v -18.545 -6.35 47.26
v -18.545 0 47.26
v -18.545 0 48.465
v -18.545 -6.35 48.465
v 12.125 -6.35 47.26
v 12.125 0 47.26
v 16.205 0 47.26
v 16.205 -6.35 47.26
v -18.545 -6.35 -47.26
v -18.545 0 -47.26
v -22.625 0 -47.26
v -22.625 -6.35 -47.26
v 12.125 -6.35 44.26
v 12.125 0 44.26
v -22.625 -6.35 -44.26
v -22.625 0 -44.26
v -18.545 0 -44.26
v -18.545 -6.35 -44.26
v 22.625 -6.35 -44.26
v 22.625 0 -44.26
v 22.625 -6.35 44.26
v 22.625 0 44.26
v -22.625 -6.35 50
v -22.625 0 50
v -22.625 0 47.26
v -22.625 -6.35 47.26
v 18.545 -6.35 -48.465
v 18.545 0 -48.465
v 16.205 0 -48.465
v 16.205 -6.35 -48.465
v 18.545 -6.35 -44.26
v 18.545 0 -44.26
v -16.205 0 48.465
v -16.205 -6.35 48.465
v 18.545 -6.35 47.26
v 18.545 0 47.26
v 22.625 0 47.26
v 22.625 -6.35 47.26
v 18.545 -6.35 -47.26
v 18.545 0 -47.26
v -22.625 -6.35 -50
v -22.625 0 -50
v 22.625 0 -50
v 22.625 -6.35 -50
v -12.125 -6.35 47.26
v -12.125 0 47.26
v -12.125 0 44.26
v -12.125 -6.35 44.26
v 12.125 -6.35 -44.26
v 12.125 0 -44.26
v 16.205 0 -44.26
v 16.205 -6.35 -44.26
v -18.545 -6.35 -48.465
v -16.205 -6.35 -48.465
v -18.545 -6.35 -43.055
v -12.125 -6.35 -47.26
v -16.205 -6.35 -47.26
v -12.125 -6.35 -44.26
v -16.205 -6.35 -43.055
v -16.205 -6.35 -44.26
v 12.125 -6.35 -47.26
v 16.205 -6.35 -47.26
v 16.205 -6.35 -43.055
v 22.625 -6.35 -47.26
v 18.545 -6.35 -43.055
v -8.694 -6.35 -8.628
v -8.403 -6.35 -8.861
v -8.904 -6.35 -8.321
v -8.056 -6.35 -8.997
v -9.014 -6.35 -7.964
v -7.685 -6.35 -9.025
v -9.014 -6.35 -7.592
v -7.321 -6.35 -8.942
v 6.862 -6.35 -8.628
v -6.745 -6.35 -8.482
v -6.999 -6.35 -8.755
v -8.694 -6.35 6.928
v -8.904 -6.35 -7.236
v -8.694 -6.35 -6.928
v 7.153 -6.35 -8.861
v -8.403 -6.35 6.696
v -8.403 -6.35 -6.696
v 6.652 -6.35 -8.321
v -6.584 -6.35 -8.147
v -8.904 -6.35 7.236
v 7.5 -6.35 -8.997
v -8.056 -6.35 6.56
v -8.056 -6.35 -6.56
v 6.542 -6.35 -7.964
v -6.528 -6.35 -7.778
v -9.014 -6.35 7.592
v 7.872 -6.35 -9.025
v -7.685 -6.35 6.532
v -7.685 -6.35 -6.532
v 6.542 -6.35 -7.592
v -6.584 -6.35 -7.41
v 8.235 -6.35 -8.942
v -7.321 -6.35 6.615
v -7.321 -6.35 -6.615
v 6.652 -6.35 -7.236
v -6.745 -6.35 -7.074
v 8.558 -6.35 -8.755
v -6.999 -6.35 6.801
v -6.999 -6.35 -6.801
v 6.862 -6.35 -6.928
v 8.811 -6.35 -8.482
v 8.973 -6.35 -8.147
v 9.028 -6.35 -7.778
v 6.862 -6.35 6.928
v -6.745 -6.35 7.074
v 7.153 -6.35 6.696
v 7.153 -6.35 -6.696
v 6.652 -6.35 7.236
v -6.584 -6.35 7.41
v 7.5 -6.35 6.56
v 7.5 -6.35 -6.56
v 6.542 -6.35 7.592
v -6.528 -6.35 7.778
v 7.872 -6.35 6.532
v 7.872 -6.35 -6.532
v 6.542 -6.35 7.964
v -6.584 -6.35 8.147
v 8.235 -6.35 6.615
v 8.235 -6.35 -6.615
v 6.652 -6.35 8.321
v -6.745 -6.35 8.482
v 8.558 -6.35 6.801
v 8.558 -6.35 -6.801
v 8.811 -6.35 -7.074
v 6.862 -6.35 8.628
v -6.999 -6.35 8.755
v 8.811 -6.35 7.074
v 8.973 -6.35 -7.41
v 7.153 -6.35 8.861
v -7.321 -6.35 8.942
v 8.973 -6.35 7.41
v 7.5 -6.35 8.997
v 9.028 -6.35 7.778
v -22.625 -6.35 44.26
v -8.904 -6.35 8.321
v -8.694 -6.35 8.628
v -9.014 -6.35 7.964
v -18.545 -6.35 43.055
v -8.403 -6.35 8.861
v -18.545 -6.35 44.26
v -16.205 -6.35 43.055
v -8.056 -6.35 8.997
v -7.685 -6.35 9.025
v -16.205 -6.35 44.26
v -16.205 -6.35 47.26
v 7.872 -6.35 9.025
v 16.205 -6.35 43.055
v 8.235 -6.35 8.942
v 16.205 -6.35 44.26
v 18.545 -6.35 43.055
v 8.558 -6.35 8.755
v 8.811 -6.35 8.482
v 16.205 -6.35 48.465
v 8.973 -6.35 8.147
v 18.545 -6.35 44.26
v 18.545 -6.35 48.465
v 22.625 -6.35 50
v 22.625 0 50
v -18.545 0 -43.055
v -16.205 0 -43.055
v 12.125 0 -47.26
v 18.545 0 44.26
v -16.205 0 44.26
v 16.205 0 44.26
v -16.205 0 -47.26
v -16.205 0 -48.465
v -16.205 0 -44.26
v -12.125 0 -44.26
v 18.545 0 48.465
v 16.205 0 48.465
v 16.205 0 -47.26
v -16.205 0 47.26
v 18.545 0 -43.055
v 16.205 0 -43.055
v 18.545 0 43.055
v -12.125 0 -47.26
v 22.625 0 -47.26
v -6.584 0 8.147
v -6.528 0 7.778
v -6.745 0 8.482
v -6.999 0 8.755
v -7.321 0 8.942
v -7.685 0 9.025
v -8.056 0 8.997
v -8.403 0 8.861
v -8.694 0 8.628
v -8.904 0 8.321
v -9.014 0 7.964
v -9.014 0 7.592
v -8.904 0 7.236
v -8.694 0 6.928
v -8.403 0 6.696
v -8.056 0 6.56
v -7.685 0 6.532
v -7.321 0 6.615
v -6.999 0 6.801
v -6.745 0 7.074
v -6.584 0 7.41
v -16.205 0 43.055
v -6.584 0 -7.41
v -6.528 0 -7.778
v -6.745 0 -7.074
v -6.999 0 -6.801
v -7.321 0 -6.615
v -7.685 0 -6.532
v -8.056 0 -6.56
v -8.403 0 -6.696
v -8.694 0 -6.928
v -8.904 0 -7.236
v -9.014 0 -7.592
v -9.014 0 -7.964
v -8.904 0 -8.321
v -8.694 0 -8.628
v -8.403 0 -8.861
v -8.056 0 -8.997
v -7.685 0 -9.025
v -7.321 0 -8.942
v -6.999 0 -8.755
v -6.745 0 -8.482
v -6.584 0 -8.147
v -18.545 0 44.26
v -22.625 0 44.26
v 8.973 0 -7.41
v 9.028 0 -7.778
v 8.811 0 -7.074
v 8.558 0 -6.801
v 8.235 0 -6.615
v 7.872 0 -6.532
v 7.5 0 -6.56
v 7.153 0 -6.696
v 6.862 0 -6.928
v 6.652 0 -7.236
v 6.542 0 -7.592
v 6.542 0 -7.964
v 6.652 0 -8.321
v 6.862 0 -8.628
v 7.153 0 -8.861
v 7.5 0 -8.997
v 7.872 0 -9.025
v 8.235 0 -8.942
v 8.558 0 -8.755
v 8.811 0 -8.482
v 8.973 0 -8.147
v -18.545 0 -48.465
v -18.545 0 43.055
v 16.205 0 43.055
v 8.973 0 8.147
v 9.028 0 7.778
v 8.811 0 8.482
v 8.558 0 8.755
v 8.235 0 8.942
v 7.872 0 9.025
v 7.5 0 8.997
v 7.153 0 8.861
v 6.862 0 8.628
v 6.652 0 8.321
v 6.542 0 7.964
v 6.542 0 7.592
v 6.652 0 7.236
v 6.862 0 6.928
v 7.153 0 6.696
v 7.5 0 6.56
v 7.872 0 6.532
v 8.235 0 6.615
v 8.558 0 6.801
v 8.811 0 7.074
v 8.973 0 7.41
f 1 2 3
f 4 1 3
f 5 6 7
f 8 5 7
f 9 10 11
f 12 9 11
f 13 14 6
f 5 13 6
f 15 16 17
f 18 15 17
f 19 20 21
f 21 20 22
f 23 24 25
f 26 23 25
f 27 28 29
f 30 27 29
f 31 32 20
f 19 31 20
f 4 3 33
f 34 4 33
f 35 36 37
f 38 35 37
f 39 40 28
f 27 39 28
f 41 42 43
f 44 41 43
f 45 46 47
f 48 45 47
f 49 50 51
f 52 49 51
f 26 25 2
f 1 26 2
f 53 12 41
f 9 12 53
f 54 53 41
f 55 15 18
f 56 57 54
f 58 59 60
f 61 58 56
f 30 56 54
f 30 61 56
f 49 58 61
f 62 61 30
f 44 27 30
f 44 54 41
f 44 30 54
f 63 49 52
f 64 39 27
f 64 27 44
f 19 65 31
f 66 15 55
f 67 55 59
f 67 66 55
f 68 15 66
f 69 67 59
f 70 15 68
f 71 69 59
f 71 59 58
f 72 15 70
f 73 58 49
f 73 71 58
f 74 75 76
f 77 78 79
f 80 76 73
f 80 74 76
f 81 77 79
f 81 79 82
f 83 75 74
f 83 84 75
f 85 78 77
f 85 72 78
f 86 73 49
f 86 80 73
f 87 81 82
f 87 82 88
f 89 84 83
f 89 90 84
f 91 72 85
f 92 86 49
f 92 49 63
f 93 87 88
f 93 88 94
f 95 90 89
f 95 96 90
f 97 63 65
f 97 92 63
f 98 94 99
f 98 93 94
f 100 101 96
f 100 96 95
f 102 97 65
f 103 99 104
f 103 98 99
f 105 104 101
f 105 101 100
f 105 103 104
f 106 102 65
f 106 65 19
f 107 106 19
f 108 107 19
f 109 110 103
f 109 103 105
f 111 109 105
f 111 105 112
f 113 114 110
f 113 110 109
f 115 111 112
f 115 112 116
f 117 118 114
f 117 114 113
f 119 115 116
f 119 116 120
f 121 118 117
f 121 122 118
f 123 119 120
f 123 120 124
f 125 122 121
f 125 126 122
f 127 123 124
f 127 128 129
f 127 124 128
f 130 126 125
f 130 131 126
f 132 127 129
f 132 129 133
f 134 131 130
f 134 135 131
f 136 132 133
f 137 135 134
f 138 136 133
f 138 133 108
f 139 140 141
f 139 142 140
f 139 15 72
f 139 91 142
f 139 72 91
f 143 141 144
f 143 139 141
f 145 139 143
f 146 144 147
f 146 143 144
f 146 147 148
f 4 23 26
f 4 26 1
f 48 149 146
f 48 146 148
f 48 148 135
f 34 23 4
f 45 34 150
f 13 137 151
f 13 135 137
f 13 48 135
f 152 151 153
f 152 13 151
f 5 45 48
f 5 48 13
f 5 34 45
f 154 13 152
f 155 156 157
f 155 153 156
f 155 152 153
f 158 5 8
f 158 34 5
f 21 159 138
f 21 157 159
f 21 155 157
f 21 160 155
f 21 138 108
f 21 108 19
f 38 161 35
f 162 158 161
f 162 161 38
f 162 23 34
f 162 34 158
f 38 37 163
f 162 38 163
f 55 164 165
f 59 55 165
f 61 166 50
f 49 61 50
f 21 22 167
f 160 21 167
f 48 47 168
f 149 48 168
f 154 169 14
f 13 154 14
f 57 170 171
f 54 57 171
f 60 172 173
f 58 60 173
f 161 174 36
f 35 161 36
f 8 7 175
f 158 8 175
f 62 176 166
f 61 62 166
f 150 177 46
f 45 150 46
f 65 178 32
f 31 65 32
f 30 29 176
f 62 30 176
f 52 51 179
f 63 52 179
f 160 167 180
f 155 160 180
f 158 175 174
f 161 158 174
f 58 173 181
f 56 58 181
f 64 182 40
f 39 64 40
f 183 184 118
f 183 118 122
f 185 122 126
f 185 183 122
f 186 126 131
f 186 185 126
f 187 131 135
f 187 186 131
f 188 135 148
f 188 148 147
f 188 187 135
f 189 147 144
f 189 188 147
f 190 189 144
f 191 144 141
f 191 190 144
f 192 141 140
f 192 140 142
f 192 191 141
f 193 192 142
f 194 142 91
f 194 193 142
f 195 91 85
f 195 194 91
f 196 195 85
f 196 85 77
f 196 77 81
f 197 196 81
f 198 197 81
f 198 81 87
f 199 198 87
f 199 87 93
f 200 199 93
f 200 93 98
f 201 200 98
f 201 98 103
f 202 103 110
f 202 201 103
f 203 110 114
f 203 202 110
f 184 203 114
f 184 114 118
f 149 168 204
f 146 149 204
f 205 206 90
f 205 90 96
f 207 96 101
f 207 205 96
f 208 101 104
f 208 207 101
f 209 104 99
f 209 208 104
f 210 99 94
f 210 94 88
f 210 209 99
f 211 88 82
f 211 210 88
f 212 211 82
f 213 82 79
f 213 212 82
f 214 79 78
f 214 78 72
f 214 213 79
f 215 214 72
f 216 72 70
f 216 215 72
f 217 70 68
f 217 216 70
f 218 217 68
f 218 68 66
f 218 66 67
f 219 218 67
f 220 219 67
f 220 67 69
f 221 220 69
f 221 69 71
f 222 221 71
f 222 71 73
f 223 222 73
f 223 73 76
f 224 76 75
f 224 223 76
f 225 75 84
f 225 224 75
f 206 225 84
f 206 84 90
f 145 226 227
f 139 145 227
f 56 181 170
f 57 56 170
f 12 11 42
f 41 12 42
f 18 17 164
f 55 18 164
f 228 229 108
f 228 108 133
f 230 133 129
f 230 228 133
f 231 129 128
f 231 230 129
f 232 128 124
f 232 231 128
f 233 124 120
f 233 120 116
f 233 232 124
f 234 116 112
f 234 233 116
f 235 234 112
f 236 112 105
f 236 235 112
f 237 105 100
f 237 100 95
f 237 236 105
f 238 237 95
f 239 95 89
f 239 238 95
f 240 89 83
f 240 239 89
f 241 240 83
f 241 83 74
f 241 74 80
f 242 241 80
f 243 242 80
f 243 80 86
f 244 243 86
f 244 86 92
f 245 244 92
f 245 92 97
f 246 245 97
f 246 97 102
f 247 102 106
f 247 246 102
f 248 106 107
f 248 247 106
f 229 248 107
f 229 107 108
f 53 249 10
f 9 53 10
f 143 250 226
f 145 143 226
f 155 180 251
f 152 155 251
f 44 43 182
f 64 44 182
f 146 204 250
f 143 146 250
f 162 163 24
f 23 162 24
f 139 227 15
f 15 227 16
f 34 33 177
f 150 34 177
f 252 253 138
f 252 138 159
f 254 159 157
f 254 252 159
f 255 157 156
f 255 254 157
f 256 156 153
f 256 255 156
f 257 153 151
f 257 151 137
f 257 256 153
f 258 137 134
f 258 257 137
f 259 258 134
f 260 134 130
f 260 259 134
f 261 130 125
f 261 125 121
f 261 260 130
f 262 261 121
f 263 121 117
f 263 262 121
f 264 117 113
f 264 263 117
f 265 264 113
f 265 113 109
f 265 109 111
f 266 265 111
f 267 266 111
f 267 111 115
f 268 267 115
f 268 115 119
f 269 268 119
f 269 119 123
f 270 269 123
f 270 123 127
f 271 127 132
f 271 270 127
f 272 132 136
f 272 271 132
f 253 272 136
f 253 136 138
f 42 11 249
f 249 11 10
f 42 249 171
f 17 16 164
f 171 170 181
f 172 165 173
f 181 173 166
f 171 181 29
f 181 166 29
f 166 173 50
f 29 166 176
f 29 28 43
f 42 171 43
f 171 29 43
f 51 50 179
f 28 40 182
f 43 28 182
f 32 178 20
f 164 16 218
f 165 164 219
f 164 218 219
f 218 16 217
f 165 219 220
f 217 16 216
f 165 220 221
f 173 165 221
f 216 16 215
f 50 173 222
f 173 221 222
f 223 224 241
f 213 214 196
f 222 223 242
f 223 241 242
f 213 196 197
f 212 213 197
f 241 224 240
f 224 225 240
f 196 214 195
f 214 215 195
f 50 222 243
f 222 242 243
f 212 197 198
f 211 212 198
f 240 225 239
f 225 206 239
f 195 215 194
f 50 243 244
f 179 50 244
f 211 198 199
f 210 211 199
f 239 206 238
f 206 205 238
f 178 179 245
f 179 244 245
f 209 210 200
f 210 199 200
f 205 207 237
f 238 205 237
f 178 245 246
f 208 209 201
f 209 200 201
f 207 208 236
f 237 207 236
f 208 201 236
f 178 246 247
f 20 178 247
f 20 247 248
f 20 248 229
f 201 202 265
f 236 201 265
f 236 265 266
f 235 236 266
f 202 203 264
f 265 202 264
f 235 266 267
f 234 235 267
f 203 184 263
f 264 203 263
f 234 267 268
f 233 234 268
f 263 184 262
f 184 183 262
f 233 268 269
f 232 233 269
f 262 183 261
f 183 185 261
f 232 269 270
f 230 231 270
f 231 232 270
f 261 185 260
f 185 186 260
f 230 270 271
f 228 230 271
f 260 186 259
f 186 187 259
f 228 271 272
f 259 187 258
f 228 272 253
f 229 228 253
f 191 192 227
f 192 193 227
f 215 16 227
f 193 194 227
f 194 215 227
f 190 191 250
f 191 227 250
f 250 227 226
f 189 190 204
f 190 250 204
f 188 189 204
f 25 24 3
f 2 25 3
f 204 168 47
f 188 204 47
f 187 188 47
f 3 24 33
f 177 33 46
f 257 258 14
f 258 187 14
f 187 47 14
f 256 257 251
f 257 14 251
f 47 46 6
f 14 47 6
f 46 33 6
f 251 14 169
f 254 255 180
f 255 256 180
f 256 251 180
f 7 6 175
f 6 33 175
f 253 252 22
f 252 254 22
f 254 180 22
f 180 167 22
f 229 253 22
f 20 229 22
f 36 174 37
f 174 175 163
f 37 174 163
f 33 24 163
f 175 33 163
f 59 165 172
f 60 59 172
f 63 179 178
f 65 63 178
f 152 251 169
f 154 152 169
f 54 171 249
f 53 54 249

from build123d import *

# Parameters (mm, degrees)
F0_R     = 1.25
F1_DEPTH = 6.35


with BuildPart() as f1:
    # F0 (on Front) → F1 (new body)
    with BuildSketch(Plane.XZ):
        Polygon((22.625, 47.26), (22.625, 50), (-22.625, 50), (-22.625, 47.26), (-18.545, 47.26), (-18.545, 48.465), (-16.205, 48.465), (-16.205, 47.26), (-12.125, 47.26), (-12.125, 44.26), (-16.205, 44.26), (-16.205, 43.055), (-18.545, 43.055), (-18.545, 44.26), (-22.625, 44.26), (-22.625, -44.26), (-18.545, -44.26), (-18.545, -43.055), (-16.205, -43.055), (-16.205, -44.26), (-12.125, -44.26), (-12.125, -47.26), (-16.205, -47.26), (-16.205, -48.465), (-18.545, -48.465), (-18.545, -47.26), (-22.625, -47.26), (-22.625, -50), (22.625, -50), (22.625, -47.26), (18.545, -47.26), (18.545, -48.465), (16.205, -48.465), (16.205, -47.26), (12.125, -47.26), (12.125, -44.26), (16.205, -44.26), (16.205, -43.055), (18.545, -43.055), (18.545, -44.26), (22.625, -44.26), (22.625, 44.26), (18.545, 44.26), (18.545, 43.055), (16.205, 43.055), (16.205, 44.26), (12.125, 44.26), (12.125, 47.26), (16.205, 47.26), (16.205, 48.465), (18.545, 48.465), (18.545, 47.26), align=None)
        with Locations((-7.778175, -7.778175)):
            Circle(F0_R, mode=Mode.SUBTRACT)
        with Locations((7.778175, -7.778175)):
            Circle(F0_R, mode=Mode.SUBTRACT)
        with Locations((-7.778175, 7.778175)):
            Circle(F0_R, mode=Mode.SUBTRACT)
        with Locations((7.778175, 7.778175)):
            Circle(F0_R, mode=Mode.SUBTRACT)
    extrude(amount=F1_DEPTH)


solid = f1.part
